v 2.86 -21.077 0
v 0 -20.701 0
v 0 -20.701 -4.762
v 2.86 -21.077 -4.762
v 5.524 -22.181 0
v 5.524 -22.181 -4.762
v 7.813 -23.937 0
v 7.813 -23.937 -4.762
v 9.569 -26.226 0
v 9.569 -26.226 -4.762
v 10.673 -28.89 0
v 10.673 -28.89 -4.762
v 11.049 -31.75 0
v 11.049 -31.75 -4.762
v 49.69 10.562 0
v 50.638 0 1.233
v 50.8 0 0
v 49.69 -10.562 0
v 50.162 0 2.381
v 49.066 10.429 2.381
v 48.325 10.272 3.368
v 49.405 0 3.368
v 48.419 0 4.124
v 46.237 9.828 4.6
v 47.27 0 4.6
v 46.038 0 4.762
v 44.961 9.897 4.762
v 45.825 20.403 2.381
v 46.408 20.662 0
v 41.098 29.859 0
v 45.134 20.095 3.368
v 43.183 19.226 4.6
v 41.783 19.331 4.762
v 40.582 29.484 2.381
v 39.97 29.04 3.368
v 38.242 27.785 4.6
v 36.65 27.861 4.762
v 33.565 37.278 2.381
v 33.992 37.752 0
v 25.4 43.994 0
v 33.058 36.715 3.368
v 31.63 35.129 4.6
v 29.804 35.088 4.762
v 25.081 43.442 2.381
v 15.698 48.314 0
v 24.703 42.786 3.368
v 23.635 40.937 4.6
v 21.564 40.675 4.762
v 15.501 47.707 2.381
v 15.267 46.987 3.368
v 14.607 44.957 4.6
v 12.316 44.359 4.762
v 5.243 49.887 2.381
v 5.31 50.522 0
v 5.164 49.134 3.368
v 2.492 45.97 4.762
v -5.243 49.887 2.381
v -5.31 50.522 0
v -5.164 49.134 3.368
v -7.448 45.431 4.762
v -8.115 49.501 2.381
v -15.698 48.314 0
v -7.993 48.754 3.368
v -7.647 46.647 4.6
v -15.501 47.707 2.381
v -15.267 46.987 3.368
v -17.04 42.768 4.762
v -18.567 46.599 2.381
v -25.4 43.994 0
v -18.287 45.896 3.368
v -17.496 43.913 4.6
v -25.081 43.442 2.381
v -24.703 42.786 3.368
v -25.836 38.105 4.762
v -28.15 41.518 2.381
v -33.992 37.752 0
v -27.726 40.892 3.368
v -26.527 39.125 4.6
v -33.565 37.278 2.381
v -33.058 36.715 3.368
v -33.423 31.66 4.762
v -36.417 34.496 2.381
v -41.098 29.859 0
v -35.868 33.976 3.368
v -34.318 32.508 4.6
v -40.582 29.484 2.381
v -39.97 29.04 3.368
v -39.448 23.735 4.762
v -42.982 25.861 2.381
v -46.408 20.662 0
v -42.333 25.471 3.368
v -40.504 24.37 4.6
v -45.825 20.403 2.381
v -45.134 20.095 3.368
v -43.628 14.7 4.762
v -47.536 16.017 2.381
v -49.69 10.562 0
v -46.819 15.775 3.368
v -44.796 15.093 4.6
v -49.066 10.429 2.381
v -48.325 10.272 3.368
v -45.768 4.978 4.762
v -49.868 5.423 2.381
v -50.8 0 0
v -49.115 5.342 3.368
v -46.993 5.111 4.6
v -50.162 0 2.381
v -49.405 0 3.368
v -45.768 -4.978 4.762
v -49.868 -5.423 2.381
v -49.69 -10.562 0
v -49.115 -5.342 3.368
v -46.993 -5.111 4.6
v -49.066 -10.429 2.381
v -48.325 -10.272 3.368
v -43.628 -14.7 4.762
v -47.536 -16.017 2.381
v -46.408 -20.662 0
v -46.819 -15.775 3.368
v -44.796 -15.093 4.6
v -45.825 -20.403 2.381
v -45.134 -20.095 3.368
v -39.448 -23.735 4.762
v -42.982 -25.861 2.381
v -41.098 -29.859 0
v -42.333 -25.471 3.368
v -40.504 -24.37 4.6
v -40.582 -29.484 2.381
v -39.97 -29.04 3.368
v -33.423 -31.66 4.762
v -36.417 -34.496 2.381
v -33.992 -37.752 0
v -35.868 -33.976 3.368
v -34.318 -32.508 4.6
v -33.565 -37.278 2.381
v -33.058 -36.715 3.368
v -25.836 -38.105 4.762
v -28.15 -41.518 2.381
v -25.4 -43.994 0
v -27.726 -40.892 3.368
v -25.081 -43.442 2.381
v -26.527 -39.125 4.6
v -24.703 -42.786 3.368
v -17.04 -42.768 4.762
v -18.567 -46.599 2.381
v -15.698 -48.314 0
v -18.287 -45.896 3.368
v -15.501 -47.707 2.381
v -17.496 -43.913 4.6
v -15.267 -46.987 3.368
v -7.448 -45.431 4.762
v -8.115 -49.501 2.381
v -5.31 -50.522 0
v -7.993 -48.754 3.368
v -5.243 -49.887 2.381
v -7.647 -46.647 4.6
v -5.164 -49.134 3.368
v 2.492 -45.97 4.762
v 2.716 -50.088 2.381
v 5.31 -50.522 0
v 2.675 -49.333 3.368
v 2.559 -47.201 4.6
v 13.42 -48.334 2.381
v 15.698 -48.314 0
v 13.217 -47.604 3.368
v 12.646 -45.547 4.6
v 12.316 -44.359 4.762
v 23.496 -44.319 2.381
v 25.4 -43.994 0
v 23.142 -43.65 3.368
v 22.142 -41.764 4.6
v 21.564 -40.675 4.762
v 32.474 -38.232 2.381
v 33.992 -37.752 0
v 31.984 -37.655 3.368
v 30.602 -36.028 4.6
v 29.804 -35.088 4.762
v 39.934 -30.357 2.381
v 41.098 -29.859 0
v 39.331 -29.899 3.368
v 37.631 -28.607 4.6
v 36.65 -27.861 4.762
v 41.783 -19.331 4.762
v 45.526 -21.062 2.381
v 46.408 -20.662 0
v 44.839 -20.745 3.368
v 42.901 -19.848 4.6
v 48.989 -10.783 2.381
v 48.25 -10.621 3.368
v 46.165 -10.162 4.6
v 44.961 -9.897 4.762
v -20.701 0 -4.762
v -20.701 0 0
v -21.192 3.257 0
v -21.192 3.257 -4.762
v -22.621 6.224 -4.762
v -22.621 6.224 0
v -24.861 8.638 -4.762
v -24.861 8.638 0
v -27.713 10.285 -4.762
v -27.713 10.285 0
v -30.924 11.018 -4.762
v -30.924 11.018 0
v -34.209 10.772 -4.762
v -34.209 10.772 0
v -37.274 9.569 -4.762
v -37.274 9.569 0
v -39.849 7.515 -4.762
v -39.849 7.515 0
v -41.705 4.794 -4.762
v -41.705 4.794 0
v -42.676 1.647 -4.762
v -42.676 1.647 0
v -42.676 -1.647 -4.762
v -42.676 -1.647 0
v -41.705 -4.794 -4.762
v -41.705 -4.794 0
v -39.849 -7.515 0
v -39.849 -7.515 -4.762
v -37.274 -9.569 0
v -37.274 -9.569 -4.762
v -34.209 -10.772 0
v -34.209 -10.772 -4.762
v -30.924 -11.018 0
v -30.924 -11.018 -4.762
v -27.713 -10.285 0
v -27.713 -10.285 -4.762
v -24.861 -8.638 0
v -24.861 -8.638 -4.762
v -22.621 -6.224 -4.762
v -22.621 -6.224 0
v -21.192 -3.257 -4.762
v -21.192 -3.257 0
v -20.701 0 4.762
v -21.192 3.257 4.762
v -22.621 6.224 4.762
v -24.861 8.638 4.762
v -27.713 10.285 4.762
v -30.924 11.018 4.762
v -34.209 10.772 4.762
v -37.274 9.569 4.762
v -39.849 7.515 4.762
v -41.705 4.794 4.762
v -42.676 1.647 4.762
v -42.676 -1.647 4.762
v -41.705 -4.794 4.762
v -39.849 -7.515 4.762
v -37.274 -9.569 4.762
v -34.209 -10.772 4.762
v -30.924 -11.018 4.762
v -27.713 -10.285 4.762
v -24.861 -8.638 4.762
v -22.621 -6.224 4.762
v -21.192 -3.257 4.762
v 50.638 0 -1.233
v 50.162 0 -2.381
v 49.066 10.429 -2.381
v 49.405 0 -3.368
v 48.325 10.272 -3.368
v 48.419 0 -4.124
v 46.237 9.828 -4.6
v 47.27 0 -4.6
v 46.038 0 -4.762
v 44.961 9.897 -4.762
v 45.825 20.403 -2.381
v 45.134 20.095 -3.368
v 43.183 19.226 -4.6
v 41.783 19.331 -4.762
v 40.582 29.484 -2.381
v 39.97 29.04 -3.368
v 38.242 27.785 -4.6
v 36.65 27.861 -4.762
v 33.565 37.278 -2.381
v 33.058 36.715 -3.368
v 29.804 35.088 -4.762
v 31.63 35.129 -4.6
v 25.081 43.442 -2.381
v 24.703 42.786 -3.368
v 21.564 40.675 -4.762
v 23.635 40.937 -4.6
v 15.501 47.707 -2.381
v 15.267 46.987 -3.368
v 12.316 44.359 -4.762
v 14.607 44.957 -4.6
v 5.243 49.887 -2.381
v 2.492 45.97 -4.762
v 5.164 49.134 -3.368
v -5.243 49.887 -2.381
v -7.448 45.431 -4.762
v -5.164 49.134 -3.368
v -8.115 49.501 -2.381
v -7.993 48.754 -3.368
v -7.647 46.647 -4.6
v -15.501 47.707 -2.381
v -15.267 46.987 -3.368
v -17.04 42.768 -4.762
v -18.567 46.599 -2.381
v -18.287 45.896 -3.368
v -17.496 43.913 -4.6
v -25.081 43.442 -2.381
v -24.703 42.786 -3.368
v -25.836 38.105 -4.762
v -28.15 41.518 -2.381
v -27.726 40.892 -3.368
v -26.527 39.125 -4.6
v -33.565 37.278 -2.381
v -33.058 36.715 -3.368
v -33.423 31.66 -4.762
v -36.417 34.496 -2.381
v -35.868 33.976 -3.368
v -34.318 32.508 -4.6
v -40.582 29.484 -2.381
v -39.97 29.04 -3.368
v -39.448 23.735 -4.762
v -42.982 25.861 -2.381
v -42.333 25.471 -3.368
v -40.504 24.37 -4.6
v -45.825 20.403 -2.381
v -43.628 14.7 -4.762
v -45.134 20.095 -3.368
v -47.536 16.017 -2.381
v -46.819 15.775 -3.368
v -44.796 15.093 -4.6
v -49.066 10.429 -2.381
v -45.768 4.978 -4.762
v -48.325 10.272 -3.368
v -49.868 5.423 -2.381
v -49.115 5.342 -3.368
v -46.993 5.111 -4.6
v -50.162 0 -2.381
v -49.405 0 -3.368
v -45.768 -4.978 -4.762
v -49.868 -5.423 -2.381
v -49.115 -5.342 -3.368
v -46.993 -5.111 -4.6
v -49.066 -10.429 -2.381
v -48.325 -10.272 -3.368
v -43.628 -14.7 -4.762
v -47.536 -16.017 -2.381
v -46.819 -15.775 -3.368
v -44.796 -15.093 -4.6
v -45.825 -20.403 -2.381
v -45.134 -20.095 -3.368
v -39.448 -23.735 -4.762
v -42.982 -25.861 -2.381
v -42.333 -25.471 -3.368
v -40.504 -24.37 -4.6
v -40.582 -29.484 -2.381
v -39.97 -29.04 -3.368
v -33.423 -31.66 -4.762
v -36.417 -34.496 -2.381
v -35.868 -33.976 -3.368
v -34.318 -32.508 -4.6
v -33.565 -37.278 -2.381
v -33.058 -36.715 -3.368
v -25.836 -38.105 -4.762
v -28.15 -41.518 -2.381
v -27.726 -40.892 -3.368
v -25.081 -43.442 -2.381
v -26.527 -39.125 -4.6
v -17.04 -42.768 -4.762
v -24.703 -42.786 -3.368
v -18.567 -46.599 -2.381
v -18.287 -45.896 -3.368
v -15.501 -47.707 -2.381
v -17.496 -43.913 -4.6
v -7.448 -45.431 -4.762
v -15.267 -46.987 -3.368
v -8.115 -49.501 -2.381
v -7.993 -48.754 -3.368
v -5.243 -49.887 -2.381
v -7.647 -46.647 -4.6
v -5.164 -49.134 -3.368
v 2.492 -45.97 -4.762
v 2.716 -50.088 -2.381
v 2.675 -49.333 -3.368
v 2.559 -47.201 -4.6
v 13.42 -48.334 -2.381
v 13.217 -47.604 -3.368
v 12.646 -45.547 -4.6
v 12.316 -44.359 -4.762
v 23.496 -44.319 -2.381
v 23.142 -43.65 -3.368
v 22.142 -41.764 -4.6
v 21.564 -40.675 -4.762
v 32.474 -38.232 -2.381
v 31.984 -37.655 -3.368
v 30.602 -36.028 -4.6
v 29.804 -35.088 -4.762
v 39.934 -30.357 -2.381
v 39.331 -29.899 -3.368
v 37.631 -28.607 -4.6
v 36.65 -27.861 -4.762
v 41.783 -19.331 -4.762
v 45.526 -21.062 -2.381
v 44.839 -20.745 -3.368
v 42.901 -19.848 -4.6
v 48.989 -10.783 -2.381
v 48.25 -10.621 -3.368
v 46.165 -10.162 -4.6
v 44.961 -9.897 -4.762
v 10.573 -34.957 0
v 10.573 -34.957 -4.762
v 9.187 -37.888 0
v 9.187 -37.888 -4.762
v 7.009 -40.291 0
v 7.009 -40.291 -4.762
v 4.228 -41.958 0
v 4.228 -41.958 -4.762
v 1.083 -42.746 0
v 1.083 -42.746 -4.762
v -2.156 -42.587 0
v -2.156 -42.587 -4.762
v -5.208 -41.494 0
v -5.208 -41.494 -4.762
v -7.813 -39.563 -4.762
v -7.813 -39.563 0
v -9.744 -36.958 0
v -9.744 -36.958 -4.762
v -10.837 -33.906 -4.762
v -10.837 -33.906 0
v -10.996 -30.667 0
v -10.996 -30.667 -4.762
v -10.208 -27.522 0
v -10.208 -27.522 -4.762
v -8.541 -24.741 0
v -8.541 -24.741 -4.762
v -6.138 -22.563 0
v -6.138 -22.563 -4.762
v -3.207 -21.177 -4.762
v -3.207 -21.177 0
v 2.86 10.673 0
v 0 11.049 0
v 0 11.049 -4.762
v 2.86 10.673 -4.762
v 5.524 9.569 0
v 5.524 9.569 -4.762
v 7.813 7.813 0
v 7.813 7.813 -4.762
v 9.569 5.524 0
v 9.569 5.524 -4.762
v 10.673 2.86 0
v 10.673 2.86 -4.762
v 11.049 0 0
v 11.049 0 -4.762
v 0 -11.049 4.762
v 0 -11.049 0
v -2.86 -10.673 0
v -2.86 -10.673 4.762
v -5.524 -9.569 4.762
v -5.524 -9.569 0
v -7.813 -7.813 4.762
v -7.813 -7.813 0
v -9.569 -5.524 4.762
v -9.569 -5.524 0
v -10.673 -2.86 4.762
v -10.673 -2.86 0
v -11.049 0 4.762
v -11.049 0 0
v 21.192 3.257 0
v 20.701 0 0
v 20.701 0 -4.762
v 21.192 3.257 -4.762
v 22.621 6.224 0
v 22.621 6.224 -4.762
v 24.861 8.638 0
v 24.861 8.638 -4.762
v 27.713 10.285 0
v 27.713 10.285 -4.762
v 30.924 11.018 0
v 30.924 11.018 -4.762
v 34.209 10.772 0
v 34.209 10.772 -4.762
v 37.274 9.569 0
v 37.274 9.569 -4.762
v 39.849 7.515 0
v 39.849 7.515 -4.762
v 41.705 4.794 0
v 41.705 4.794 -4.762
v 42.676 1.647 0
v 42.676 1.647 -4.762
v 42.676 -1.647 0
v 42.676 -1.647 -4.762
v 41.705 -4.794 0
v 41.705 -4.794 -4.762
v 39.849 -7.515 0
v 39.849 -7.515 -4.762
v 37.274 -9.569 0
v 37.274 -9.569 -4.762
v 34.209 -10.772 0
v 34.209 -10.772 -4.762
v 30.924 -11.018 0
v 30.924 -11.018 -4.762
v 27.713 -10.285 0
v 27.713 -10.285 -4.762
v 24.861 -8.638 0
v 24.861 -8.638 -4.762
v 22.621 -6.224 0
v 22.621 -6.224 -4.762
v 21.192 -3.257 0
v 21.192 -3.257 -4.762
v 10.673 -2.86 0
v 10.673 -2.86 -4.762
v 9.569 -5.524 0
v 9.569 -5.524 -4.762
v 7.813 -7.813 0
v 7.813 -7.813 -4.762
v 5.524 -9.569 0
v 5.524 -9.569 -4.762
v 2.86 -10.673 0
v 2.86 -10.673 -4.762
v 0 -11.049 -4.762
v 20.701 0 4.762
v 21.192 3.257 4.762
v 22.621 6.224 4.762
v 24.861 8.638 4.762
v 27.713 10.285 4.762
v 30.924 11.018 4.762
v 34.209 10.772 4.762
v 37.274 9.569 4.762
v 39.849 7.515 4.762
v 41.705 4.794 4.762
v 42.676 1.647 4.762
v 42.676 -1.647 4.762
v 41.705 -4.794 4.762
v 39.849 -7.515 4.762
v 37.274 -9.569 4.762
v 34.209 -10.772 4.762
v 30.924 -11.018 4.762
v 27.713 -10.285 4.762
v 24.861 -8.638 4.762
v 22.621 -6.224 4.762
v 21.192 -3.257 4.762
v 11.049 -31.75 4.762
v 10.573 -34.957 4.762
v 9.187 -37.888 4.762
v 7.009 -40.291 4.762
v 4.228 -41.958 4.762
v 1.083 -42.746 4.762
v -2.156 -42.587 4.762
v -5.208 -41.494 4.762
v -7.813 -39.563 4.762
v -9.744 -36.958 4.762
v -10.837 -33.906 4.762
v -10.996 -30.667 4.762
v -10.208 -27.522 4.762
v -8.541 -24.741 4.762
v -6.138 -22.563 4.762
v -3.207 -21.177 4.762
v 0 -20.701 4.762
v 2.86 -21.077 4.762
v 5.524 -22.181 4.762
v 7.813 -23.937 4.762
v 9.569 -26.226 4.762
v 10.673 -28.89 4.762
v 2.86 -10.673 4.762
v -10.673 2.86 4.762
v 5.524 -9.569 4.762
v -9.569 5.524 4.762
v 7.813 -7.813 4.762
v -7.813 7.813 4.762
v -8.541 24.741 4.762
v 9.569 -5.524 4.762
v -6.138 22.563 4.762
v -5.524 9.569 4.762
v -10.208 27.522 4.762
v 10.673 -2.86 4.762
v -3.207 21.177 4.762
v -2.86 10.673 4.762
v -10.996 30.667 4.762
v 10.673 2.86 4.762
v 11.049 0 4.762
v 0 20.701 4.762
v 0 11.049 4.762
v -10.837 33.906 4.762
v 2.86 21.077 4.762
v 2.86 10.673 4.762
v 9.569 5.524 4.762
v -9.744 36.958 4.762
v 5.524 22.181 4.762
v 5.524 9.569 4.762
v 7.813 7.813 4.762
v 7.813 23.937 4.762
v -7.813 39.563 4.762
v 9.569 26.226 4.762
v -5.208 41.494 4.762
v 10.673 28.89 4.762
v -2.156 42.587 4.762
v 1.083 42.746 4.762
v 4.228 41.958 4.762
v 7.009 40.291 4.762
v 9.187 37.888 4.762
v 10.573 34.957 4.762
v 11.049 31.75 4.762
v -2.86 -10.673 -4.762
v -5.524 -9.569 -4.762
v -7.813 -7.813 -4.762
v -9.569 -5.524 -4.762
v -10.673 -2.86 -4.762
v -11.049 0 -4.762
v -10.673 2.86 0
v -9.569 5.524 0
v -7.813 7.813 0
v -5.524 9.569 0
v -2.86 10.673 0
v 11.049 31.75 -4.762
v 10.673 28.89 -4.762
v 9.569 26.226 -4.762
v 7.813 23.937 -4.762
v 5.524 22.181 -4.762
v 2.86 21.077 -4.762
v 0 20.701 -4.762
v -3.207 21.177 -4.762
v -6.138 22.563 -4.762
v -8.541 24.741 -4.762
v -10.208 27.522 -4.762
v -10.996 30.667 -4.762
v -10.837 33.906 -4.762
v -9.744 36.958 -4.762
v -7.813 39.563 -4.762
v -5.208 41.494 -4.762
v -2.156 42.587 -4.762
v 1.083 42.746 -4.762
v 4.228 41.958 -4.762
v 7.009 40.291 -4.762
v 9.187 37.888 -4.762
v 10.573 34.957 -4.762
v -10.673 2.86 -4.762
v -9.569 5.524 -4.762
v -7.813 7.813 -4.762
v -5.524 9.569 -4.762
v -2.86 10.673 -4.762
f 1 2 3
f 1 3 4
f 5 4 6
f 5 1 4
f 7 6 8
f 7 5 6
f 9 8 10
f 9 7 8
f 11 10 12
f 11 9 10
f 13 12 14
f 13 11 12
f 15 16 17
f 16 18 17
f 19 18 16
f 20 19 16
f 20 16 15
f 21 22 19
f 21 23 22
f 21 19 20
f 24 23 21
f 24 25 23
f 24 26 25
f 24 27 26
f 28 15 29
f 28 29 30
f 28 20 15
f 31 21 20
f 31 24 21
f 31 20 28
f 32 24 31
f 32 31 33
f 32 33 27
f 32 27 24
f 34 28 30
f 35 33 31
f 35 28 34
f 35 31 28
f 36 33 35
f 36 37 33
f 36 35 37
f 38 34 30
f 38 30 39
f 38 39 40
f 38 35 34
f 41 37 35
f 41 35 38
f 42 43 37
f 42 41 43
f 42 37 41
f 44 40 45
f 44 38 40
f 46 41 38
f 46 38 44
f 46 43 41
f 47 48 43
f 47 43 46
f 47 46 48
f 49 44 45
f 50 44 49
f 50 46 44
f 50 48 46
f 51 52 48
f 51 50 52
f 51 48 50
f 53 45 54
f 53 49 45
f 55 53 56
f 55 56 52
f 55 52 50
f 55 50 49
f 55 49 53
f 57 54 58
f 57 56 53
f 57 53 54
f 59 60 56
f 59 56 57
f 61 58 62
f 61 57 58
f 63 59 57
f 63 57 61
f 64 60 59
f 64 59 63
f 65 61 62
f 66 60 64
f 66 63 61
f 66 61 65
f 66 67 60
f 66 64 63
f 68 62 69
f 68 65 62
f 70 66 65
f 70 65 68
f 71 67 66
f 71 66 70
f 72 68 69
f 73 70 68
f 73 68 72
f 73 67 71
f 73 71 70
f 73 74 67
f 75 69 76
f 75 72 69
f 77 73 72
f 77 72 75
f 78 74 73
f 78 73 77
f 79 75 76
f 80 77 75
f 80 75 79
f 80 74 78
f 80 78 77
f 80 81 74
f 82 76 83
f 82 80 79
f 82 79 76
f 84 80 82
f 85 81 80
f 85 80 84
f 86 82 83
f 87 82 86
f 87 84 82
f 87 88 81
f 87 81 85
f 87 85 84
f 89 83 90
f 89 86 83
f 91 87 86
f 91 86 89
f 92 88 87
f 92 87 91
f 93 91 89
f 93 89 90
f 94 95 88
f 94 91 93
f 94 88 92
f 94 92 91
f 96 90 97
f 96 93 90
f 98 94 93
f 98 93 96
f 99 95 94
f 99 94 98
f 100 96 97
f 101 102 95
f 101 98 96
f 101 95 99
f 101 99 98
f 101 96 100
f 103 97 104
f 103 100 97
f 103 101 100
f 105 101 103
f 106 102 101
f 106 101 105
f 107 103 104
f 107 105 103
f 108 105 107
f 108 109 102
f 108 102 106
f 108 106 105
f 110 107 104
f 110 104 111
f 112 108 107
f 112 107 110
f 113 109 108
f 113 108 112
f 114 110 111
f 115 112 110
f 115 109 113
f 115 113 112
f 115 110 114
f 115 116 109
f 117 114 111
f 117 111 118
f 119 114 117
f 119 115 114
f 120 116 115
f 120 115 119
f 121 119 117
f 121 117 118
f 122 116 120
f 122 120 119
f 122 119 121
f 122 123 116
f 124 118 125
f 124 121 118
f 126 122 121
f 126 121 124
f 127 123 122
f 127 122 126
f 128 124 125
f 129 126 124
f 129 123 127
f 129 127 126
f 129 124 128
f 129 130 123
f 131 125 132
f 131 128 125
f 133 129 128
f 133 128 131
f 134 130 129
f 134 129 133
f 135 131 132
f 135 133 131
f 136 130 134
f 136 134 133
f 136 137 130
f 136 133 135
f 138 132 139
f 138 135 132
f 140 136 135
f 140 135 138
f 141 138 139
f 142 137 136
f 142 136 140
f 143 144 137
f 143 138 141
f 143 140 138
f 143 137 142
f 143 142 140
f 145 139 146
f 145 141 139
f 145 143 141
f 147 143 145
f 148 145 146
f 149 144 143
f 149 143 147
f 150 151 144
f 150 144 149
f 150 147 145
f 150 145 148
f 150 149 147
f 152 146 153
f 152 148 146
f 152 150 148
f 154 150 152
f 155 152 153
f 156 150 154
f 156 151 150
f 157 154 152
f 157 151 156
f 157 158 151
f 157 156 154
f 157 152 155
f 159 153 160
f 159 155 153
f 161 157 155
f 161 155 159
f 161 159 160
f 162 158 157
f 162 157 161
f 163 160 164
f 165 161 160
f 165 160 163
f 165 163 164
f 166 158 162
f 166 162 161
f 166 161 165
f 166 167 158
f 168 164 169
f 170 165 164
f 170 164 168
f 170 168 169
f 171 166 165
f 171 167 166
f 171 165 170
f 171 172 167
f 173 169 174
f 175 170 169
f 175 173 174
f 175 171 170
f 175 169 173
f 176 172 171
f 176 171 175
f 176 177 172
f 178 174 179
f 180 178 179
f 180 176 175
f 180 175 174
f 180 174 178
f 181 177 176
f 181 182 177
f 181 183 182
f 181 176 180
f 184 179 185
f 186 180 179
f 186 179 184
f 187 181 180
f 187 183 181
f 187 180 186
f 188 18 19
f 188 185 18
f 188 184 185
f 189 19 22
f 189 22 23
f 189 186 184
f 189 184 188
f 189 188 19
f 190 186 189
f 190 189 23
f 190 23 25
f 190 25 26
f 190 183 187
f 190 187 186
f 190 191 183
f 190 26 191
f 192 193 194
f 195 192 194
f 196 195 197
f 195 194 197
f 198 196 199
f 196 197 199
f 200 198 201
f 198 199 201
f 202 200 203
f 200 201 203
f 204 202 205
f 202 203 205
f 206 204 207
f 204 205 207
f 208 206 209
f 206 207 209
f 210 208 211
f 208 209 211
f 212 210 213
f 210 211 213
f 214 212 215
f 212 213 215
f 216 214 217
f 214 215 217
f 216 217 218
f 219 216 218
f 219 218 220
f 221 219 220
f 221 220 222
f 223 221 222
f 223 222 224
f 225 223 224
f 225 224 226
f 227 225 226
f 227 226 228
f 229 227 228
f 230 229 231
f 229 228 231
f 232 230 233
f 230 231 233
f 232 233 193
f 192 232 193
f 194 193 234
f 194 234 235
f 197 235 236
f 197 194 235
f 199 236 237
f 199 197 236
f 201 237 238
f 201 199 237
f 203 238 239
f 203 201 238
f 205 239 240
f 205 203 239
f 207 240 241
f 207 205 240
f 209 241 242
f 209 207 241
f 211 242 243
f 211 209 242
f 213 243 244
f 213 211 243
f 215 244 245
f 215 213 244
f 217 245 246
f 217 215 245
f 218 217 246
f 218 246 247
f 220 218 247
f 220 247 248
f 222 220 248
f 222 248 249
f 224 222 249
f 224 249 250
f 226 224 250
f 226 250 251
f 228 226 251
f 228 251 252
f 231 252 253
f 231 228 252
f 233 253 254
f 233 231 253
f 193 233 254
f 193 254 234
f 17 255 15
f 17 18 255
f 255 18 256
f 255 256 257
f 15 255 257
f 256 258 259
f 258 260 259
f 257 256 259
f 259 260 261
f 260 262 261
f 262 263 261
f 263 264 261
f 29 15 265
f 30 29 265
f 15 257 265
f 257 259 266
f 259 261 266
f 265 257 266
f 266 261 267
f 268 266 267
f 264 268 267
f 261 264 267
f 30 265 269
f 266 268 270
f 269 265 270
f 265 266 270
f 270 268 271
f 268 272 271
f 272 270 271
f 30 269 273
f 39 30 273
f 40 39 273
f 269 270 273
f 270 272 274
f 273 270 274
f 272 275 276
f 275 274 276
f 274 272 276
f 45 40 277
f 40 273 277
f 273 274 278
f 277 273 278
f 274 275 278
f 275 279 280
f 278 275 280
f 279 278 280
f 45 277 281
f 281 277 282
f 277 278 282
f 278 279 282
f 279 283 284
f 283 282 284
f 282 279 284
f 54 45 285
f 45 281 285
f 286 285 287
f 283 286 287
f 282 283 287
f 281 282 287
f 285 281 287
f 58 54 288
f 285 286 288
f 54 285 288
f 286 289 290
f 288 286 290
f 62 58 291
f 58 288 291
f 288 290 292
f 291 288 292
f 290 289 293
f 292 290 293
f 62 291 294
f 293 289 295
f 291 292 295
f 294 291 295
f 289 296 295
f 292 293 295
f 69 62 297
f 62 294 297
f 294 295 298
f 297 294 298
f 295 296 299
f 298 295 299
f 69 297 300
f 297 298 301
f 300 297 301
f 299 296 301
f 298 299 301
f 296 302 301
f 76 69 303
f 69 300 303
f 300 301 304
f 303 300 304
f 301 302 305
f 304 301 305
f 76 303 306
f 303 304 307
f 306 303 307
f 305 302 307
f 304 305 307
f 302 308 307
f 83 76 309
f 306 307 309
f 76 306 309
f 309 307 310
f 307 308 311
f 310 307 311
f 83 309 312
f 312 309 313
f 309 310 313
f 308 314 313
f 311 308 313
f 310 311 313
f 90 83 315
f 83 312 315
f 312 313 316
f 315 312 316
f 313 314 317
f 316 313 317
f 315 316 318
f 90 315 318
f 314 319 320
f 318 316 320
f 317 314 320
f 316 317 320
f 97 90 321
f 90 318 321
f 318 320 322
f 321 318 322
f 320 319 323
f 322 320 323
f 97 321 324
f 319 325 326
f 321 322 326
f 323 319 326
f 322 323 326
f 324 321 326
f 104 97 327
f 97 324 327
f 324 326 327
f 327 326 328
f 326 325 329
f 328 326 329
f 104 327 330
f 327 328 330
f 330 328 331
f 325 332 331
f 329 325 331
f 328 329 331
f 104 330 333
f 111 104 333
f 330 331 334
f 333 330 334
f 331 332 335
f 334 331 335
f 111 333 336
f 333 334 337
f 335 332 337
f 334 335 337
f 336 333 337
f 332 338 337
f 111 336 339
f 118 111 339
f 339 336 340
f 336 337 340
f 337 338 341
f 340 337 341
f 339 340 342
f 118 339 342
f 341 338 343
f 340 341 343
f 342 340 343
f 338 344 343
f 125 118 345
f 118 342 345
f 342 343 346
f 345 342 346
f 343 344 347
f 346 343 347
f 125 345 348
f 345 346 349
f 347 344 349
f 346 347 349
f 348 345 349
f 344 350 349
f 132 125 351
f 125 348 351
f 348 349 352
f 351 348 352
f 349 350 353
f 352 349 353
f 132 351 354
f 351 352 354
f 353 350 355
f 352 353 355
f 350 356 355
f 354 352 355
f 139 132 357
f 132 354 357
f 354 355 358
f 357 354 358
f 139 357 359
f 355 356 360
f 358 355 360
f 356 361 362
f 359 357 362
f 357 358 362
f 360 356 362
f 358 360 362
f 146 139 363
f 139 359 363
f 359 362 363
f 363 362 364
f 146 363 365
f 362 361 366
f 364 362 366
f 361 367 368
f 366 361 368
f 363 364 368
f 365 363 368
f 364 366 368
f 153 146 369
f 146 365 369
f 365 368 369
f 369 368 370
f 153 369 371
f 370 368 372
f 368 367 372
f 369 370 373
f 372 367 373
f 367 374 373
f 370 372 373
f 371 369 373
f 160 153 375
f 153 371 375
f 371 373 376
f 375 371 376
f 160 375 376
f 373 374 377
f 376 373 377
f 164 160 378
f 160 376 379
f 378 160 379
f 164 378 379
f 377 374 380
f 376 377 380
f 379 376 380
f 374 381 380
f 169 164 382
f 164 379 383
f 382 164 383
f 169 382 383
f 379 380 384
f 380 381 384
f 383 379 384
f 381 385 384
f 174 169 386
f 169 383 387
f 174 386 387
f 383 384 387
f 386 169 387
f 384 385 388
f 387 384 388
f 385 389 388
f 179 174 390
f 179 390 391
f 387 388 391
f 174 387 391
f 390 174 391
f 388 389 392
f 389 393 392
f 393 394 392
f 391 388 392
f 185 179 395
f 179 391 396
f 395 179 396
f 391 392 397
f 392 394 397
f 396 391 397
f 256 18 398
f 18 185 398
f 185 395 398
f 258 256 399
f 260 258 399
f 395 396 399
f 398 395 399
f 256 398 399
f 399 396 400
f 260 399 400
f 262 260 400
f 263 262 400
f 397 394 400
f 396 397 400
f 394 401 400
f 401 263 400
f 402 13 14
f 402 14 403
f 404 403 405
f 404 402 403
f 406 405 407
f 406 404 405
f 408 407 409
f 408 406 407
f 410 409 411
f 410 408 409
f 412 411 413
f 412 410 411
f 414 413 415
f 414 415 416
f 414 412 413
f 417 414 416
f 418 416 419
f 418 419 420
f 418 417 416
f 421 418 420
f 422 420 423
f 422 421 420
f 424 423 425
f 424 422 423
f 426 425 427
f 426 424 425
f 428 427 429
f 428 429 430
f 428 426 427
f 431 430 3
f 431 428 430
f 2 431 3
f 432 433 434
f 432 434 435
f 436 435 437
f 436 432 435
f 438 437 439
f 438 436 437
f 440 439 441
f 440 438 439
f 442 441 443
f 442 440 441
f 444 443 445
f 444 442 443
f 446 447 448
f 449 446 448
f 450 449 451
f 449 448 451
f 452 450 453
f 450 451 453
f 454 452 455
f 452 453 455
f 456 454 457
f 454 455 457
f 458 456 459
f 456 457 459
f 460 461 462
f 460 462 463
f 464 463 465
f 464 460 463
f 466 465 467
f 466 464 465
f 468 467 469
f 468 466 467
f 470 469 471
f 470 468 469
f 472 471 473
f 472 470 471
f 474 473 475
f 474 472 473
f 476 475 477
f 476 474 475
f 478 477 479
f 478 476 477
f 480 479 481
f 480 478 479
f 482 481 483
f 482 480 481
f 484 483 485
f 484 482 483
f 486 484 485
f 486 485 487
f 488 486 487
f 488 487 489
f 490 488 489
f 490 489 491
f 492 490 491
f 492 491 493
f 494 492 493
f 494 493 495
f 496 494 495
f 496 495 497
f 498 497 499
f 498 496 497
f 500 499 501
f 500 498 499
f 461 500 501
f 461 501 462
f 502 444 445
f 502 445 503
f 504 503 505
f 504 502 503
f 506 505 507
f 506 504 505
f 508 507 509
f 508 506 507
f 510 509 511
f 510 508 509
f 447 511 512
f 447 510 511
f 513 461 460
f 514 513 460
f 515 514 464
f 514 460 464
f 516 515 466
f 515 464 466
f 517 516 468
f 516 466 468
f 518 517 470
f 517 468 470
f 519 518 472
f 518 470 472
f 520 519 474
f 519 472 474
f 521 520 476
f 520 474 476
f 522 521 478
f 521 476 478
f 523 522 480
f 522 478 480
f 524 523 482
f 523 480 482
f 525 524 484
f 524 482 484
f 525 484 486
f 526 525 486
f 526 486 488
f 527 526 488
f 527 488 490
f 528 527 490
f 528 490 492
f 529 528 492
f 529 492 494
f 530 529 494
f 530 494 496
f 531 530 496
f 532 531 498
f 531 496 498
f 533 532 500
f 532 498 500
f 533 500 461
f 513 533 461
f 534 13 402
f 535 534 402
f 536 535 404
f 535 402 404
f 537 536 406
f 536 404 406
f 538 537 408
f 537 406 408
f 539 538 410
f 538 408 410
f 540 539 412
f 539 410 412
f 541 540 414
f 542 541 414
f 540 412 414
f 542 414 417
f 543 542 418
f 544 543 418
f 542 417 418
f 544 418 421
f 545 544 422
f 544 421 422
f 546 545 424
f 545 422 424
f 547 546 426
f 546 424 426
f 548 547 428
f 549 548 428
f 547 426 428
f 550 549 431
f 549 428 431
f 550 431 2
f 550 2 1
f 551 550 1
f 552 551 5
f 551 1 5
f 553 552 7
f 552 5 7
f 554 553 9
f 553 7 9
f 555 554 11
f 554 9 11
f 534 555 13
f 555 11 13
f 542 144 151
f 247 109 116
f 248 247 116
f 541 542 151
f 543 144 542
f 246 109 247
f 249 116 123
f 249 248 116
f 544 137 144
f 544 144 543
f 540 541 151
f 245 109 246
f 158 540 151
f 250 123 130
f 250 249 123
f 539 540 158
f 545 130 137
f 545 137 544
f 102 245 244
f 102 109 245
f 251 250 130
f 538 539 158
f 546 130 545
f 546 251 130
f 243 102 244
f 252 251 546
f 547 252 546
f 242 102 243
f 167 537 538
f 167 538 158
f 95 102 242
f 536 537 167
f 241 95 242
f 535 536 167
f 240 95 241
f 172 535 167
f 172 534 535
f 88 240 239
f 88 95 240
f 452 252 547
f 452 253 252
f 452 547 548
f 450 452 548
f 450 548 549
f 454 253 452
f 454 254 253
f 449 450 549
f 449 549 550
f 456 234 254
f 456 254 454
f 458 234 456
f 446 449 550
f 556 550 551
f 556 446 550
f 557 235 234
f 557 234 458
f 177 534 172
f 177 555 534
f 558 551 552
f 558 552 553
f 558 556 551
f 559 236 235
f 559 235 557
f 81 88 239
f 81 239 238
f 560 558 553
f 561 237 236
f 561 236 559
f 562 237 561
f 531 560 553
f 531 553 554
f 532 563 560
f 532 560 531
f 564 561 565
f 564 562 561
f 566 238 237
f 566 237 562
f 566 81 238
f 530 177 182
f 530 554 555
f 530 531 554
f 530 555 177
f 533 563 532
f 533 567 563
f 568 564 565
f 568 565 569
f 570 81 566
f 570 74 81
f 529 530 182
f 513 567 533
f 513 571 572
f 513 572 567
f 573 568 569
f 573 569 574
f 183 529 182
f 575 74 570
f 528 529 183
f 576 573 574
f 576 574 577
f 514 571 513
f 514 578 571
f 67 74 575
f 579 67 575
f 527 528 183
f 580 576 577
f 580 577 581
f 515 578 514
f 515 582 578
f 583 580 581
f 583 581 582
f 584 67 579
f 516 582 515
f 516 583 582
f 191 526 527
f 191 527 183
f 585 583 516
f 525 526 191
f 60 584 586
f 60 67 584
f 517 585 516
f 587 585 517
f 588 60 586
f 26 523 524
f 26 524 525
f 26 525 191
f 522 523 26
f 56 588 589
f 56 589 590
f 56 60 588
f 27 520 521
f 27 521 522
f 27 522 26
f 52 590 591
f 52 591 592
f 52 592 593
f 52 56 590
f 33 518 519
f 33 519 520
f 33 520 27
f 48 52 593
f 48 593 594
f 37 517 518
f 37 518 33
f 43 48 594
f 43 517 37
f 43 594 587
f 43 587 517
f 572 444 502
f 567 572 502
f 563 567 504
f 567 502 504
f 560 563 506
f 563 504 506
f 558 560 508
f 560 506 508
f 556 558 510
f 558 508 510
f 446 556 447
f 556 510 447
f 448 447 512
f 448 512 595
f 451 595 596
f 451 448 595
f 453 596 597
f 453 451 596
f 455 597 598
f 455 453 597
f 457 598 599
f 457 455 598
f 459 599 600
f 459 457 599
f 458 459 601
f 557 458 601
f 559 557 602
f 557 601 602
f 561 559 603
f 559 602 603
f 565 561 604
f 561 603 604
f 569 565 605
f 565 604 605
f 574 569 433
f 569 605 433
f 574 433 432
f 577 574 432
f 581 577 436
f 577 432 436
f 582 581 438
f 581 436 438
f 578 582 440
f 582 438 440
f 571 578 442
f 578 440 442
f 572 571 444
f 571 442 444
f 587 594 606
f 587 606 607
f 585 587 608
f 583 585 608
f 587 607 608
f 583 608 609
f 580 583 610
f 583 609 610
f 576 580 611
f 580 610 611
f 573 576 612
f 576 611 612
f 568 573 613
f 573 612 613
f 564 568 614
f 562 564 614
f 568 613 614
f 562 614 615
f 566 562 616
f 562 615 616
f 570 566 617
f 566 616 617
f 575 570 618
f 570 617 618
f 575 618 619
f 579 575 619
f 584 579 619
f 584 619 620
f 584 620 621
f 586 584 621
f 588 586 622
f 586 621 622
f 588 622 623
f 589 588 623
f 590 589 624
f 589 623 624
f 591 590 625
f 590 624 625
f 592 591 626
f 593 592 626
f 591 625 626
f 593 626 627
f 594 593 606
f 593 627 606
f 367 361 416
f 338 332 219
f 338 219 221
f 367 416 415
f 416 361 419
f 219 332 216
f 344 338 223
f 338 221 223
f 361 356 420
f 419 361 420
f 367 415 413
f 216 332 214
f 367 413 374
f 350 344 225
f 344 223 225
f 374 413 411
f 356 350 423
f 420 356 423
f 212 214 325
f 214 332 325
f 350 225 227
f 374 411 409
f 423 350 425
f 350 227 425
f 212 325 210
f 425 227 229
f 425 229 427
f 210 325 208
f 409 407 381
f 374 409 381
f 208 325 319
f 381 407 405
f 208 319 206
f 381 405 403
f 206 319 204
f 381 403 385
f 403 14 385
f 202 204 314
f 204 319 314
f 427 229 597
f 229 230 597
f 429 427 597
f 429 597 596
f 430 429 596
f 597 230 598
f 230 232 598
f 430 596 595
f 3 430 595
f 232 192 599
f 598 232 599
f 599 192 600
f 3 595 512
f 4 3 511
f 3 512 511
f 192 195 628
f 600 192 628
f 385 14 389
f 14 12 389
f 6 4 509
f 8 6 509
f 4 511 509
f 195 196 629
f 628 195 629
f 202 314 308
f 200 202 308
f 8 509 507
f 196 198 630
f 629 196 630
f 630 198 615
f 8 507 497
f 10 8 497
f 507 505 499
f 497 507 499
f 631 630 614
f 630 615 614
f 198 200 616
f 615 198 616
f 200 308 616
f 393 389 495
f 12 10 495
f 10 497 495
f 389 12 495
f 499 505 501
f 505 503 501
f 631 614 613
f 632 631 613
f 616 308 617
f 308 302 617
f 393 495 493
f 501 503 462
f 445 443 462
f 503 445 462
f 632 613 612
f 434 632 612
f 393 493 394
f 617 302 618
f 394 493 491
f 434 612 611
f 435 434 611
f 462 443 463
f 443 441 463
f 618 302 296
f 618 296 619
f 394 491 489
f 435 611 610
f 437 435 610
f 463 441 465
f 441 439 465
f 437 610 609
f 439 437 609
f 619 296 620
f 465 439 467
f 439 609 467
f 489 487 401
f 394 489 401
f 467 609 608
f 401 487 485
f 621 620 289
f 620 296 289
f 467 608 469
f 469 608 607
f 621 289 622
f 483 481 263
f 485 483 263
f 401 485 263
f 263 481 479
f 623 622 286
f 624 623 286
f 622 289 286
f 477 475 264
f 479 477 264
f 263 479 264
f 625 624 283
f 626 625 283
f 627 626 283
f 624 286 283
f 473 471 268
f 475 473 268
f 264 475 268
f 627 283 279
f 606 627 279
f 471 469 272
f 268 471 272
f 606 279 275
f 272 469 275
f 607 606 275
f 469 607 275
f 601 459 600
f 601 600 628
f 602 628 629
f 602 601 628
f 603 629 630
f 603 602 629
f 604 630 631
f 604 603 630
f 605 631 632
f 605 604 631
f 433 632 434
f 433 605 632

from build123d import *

# Parameters (mm, degrees)
F0_R     = 50.8
F0_R_2   = 11.049
F1_DEPTH = 4.7625
F2_R     = 4.76249


# Not quite as in the source:
# - a fillet or chamfer is up to 0.001 mm smaller than in the source, because OpenCascade refuses the exact size


with BuildPart() as f1:
    # F0 (on Top) → F1 (new body, symmetric)
    with BuildSketch(Plane.XY):
        Circle(F0_R)
        with BuildLine():
            ThreePointArc((11.049, -31.75), (-7.8128228253, -39.5628228253), (0, -20.701))
            ThreePointArc((0, -20.701), (7.8128228253, -23.9371771747), (11.049, -31.75))
        make_face(mode=Mode.SUBTRACT)
        with Locations((-31.75, 0)):
            Circle(F0_R_2, mode=Mode.SUBTRACT)
        with BuildLine():
            ThreePointArc((0, 11.049), (7.8128228253, 7.8128228253), (11.049, 0))
            ThreePointArc((11.049, 0), (7.8128228253, -7.8128228253), (0, -11.049))
            ThreePointArc((0, -11.049), (-7.8128228253, -7.8128228253), (-11.049, 0))
            ThreePointArc((-11.049, 0), (-7.8128228253, 7.8128228253), (0, 11.049))
        make_face(mode=Mode.SUBTRACT)
        with BuildLine():
            ThreePointArc((42.799, 0), (31.75, -11.049), (20.701, 0))
            ThreePointArc((20.701, 0), (31.75, 11.049), (42.799, 0))
        make_face(mode=Mode.SUBTRACT)
        with BuildLine():
            ThreePointArc((11.049, 31.75), (7.8128228253, 23.9371771747), (0, 20.701))
            ThreePointArc((0, 20.701), (-7.8128228253, 39.5628228253), (11.049, 31.75))
        make_face(mode=Mode.SUBTRACT)
    extrude(amount=F1_DEPTH, both=True)

    # F2 (radius 4.7625 in the source; OpenCascade refuses exactly that, so slightly less here)
    f2_edges = [f1.edges().sort_by_distance(p)[0] for p in [
        (-50.8, 0, -4.7625),
        (50.8, 0, 0),
        (-50.8, 0, 4.7625),
    ]]
    fillet(f2_edges, radius=F2_R)


solid = f1.part
